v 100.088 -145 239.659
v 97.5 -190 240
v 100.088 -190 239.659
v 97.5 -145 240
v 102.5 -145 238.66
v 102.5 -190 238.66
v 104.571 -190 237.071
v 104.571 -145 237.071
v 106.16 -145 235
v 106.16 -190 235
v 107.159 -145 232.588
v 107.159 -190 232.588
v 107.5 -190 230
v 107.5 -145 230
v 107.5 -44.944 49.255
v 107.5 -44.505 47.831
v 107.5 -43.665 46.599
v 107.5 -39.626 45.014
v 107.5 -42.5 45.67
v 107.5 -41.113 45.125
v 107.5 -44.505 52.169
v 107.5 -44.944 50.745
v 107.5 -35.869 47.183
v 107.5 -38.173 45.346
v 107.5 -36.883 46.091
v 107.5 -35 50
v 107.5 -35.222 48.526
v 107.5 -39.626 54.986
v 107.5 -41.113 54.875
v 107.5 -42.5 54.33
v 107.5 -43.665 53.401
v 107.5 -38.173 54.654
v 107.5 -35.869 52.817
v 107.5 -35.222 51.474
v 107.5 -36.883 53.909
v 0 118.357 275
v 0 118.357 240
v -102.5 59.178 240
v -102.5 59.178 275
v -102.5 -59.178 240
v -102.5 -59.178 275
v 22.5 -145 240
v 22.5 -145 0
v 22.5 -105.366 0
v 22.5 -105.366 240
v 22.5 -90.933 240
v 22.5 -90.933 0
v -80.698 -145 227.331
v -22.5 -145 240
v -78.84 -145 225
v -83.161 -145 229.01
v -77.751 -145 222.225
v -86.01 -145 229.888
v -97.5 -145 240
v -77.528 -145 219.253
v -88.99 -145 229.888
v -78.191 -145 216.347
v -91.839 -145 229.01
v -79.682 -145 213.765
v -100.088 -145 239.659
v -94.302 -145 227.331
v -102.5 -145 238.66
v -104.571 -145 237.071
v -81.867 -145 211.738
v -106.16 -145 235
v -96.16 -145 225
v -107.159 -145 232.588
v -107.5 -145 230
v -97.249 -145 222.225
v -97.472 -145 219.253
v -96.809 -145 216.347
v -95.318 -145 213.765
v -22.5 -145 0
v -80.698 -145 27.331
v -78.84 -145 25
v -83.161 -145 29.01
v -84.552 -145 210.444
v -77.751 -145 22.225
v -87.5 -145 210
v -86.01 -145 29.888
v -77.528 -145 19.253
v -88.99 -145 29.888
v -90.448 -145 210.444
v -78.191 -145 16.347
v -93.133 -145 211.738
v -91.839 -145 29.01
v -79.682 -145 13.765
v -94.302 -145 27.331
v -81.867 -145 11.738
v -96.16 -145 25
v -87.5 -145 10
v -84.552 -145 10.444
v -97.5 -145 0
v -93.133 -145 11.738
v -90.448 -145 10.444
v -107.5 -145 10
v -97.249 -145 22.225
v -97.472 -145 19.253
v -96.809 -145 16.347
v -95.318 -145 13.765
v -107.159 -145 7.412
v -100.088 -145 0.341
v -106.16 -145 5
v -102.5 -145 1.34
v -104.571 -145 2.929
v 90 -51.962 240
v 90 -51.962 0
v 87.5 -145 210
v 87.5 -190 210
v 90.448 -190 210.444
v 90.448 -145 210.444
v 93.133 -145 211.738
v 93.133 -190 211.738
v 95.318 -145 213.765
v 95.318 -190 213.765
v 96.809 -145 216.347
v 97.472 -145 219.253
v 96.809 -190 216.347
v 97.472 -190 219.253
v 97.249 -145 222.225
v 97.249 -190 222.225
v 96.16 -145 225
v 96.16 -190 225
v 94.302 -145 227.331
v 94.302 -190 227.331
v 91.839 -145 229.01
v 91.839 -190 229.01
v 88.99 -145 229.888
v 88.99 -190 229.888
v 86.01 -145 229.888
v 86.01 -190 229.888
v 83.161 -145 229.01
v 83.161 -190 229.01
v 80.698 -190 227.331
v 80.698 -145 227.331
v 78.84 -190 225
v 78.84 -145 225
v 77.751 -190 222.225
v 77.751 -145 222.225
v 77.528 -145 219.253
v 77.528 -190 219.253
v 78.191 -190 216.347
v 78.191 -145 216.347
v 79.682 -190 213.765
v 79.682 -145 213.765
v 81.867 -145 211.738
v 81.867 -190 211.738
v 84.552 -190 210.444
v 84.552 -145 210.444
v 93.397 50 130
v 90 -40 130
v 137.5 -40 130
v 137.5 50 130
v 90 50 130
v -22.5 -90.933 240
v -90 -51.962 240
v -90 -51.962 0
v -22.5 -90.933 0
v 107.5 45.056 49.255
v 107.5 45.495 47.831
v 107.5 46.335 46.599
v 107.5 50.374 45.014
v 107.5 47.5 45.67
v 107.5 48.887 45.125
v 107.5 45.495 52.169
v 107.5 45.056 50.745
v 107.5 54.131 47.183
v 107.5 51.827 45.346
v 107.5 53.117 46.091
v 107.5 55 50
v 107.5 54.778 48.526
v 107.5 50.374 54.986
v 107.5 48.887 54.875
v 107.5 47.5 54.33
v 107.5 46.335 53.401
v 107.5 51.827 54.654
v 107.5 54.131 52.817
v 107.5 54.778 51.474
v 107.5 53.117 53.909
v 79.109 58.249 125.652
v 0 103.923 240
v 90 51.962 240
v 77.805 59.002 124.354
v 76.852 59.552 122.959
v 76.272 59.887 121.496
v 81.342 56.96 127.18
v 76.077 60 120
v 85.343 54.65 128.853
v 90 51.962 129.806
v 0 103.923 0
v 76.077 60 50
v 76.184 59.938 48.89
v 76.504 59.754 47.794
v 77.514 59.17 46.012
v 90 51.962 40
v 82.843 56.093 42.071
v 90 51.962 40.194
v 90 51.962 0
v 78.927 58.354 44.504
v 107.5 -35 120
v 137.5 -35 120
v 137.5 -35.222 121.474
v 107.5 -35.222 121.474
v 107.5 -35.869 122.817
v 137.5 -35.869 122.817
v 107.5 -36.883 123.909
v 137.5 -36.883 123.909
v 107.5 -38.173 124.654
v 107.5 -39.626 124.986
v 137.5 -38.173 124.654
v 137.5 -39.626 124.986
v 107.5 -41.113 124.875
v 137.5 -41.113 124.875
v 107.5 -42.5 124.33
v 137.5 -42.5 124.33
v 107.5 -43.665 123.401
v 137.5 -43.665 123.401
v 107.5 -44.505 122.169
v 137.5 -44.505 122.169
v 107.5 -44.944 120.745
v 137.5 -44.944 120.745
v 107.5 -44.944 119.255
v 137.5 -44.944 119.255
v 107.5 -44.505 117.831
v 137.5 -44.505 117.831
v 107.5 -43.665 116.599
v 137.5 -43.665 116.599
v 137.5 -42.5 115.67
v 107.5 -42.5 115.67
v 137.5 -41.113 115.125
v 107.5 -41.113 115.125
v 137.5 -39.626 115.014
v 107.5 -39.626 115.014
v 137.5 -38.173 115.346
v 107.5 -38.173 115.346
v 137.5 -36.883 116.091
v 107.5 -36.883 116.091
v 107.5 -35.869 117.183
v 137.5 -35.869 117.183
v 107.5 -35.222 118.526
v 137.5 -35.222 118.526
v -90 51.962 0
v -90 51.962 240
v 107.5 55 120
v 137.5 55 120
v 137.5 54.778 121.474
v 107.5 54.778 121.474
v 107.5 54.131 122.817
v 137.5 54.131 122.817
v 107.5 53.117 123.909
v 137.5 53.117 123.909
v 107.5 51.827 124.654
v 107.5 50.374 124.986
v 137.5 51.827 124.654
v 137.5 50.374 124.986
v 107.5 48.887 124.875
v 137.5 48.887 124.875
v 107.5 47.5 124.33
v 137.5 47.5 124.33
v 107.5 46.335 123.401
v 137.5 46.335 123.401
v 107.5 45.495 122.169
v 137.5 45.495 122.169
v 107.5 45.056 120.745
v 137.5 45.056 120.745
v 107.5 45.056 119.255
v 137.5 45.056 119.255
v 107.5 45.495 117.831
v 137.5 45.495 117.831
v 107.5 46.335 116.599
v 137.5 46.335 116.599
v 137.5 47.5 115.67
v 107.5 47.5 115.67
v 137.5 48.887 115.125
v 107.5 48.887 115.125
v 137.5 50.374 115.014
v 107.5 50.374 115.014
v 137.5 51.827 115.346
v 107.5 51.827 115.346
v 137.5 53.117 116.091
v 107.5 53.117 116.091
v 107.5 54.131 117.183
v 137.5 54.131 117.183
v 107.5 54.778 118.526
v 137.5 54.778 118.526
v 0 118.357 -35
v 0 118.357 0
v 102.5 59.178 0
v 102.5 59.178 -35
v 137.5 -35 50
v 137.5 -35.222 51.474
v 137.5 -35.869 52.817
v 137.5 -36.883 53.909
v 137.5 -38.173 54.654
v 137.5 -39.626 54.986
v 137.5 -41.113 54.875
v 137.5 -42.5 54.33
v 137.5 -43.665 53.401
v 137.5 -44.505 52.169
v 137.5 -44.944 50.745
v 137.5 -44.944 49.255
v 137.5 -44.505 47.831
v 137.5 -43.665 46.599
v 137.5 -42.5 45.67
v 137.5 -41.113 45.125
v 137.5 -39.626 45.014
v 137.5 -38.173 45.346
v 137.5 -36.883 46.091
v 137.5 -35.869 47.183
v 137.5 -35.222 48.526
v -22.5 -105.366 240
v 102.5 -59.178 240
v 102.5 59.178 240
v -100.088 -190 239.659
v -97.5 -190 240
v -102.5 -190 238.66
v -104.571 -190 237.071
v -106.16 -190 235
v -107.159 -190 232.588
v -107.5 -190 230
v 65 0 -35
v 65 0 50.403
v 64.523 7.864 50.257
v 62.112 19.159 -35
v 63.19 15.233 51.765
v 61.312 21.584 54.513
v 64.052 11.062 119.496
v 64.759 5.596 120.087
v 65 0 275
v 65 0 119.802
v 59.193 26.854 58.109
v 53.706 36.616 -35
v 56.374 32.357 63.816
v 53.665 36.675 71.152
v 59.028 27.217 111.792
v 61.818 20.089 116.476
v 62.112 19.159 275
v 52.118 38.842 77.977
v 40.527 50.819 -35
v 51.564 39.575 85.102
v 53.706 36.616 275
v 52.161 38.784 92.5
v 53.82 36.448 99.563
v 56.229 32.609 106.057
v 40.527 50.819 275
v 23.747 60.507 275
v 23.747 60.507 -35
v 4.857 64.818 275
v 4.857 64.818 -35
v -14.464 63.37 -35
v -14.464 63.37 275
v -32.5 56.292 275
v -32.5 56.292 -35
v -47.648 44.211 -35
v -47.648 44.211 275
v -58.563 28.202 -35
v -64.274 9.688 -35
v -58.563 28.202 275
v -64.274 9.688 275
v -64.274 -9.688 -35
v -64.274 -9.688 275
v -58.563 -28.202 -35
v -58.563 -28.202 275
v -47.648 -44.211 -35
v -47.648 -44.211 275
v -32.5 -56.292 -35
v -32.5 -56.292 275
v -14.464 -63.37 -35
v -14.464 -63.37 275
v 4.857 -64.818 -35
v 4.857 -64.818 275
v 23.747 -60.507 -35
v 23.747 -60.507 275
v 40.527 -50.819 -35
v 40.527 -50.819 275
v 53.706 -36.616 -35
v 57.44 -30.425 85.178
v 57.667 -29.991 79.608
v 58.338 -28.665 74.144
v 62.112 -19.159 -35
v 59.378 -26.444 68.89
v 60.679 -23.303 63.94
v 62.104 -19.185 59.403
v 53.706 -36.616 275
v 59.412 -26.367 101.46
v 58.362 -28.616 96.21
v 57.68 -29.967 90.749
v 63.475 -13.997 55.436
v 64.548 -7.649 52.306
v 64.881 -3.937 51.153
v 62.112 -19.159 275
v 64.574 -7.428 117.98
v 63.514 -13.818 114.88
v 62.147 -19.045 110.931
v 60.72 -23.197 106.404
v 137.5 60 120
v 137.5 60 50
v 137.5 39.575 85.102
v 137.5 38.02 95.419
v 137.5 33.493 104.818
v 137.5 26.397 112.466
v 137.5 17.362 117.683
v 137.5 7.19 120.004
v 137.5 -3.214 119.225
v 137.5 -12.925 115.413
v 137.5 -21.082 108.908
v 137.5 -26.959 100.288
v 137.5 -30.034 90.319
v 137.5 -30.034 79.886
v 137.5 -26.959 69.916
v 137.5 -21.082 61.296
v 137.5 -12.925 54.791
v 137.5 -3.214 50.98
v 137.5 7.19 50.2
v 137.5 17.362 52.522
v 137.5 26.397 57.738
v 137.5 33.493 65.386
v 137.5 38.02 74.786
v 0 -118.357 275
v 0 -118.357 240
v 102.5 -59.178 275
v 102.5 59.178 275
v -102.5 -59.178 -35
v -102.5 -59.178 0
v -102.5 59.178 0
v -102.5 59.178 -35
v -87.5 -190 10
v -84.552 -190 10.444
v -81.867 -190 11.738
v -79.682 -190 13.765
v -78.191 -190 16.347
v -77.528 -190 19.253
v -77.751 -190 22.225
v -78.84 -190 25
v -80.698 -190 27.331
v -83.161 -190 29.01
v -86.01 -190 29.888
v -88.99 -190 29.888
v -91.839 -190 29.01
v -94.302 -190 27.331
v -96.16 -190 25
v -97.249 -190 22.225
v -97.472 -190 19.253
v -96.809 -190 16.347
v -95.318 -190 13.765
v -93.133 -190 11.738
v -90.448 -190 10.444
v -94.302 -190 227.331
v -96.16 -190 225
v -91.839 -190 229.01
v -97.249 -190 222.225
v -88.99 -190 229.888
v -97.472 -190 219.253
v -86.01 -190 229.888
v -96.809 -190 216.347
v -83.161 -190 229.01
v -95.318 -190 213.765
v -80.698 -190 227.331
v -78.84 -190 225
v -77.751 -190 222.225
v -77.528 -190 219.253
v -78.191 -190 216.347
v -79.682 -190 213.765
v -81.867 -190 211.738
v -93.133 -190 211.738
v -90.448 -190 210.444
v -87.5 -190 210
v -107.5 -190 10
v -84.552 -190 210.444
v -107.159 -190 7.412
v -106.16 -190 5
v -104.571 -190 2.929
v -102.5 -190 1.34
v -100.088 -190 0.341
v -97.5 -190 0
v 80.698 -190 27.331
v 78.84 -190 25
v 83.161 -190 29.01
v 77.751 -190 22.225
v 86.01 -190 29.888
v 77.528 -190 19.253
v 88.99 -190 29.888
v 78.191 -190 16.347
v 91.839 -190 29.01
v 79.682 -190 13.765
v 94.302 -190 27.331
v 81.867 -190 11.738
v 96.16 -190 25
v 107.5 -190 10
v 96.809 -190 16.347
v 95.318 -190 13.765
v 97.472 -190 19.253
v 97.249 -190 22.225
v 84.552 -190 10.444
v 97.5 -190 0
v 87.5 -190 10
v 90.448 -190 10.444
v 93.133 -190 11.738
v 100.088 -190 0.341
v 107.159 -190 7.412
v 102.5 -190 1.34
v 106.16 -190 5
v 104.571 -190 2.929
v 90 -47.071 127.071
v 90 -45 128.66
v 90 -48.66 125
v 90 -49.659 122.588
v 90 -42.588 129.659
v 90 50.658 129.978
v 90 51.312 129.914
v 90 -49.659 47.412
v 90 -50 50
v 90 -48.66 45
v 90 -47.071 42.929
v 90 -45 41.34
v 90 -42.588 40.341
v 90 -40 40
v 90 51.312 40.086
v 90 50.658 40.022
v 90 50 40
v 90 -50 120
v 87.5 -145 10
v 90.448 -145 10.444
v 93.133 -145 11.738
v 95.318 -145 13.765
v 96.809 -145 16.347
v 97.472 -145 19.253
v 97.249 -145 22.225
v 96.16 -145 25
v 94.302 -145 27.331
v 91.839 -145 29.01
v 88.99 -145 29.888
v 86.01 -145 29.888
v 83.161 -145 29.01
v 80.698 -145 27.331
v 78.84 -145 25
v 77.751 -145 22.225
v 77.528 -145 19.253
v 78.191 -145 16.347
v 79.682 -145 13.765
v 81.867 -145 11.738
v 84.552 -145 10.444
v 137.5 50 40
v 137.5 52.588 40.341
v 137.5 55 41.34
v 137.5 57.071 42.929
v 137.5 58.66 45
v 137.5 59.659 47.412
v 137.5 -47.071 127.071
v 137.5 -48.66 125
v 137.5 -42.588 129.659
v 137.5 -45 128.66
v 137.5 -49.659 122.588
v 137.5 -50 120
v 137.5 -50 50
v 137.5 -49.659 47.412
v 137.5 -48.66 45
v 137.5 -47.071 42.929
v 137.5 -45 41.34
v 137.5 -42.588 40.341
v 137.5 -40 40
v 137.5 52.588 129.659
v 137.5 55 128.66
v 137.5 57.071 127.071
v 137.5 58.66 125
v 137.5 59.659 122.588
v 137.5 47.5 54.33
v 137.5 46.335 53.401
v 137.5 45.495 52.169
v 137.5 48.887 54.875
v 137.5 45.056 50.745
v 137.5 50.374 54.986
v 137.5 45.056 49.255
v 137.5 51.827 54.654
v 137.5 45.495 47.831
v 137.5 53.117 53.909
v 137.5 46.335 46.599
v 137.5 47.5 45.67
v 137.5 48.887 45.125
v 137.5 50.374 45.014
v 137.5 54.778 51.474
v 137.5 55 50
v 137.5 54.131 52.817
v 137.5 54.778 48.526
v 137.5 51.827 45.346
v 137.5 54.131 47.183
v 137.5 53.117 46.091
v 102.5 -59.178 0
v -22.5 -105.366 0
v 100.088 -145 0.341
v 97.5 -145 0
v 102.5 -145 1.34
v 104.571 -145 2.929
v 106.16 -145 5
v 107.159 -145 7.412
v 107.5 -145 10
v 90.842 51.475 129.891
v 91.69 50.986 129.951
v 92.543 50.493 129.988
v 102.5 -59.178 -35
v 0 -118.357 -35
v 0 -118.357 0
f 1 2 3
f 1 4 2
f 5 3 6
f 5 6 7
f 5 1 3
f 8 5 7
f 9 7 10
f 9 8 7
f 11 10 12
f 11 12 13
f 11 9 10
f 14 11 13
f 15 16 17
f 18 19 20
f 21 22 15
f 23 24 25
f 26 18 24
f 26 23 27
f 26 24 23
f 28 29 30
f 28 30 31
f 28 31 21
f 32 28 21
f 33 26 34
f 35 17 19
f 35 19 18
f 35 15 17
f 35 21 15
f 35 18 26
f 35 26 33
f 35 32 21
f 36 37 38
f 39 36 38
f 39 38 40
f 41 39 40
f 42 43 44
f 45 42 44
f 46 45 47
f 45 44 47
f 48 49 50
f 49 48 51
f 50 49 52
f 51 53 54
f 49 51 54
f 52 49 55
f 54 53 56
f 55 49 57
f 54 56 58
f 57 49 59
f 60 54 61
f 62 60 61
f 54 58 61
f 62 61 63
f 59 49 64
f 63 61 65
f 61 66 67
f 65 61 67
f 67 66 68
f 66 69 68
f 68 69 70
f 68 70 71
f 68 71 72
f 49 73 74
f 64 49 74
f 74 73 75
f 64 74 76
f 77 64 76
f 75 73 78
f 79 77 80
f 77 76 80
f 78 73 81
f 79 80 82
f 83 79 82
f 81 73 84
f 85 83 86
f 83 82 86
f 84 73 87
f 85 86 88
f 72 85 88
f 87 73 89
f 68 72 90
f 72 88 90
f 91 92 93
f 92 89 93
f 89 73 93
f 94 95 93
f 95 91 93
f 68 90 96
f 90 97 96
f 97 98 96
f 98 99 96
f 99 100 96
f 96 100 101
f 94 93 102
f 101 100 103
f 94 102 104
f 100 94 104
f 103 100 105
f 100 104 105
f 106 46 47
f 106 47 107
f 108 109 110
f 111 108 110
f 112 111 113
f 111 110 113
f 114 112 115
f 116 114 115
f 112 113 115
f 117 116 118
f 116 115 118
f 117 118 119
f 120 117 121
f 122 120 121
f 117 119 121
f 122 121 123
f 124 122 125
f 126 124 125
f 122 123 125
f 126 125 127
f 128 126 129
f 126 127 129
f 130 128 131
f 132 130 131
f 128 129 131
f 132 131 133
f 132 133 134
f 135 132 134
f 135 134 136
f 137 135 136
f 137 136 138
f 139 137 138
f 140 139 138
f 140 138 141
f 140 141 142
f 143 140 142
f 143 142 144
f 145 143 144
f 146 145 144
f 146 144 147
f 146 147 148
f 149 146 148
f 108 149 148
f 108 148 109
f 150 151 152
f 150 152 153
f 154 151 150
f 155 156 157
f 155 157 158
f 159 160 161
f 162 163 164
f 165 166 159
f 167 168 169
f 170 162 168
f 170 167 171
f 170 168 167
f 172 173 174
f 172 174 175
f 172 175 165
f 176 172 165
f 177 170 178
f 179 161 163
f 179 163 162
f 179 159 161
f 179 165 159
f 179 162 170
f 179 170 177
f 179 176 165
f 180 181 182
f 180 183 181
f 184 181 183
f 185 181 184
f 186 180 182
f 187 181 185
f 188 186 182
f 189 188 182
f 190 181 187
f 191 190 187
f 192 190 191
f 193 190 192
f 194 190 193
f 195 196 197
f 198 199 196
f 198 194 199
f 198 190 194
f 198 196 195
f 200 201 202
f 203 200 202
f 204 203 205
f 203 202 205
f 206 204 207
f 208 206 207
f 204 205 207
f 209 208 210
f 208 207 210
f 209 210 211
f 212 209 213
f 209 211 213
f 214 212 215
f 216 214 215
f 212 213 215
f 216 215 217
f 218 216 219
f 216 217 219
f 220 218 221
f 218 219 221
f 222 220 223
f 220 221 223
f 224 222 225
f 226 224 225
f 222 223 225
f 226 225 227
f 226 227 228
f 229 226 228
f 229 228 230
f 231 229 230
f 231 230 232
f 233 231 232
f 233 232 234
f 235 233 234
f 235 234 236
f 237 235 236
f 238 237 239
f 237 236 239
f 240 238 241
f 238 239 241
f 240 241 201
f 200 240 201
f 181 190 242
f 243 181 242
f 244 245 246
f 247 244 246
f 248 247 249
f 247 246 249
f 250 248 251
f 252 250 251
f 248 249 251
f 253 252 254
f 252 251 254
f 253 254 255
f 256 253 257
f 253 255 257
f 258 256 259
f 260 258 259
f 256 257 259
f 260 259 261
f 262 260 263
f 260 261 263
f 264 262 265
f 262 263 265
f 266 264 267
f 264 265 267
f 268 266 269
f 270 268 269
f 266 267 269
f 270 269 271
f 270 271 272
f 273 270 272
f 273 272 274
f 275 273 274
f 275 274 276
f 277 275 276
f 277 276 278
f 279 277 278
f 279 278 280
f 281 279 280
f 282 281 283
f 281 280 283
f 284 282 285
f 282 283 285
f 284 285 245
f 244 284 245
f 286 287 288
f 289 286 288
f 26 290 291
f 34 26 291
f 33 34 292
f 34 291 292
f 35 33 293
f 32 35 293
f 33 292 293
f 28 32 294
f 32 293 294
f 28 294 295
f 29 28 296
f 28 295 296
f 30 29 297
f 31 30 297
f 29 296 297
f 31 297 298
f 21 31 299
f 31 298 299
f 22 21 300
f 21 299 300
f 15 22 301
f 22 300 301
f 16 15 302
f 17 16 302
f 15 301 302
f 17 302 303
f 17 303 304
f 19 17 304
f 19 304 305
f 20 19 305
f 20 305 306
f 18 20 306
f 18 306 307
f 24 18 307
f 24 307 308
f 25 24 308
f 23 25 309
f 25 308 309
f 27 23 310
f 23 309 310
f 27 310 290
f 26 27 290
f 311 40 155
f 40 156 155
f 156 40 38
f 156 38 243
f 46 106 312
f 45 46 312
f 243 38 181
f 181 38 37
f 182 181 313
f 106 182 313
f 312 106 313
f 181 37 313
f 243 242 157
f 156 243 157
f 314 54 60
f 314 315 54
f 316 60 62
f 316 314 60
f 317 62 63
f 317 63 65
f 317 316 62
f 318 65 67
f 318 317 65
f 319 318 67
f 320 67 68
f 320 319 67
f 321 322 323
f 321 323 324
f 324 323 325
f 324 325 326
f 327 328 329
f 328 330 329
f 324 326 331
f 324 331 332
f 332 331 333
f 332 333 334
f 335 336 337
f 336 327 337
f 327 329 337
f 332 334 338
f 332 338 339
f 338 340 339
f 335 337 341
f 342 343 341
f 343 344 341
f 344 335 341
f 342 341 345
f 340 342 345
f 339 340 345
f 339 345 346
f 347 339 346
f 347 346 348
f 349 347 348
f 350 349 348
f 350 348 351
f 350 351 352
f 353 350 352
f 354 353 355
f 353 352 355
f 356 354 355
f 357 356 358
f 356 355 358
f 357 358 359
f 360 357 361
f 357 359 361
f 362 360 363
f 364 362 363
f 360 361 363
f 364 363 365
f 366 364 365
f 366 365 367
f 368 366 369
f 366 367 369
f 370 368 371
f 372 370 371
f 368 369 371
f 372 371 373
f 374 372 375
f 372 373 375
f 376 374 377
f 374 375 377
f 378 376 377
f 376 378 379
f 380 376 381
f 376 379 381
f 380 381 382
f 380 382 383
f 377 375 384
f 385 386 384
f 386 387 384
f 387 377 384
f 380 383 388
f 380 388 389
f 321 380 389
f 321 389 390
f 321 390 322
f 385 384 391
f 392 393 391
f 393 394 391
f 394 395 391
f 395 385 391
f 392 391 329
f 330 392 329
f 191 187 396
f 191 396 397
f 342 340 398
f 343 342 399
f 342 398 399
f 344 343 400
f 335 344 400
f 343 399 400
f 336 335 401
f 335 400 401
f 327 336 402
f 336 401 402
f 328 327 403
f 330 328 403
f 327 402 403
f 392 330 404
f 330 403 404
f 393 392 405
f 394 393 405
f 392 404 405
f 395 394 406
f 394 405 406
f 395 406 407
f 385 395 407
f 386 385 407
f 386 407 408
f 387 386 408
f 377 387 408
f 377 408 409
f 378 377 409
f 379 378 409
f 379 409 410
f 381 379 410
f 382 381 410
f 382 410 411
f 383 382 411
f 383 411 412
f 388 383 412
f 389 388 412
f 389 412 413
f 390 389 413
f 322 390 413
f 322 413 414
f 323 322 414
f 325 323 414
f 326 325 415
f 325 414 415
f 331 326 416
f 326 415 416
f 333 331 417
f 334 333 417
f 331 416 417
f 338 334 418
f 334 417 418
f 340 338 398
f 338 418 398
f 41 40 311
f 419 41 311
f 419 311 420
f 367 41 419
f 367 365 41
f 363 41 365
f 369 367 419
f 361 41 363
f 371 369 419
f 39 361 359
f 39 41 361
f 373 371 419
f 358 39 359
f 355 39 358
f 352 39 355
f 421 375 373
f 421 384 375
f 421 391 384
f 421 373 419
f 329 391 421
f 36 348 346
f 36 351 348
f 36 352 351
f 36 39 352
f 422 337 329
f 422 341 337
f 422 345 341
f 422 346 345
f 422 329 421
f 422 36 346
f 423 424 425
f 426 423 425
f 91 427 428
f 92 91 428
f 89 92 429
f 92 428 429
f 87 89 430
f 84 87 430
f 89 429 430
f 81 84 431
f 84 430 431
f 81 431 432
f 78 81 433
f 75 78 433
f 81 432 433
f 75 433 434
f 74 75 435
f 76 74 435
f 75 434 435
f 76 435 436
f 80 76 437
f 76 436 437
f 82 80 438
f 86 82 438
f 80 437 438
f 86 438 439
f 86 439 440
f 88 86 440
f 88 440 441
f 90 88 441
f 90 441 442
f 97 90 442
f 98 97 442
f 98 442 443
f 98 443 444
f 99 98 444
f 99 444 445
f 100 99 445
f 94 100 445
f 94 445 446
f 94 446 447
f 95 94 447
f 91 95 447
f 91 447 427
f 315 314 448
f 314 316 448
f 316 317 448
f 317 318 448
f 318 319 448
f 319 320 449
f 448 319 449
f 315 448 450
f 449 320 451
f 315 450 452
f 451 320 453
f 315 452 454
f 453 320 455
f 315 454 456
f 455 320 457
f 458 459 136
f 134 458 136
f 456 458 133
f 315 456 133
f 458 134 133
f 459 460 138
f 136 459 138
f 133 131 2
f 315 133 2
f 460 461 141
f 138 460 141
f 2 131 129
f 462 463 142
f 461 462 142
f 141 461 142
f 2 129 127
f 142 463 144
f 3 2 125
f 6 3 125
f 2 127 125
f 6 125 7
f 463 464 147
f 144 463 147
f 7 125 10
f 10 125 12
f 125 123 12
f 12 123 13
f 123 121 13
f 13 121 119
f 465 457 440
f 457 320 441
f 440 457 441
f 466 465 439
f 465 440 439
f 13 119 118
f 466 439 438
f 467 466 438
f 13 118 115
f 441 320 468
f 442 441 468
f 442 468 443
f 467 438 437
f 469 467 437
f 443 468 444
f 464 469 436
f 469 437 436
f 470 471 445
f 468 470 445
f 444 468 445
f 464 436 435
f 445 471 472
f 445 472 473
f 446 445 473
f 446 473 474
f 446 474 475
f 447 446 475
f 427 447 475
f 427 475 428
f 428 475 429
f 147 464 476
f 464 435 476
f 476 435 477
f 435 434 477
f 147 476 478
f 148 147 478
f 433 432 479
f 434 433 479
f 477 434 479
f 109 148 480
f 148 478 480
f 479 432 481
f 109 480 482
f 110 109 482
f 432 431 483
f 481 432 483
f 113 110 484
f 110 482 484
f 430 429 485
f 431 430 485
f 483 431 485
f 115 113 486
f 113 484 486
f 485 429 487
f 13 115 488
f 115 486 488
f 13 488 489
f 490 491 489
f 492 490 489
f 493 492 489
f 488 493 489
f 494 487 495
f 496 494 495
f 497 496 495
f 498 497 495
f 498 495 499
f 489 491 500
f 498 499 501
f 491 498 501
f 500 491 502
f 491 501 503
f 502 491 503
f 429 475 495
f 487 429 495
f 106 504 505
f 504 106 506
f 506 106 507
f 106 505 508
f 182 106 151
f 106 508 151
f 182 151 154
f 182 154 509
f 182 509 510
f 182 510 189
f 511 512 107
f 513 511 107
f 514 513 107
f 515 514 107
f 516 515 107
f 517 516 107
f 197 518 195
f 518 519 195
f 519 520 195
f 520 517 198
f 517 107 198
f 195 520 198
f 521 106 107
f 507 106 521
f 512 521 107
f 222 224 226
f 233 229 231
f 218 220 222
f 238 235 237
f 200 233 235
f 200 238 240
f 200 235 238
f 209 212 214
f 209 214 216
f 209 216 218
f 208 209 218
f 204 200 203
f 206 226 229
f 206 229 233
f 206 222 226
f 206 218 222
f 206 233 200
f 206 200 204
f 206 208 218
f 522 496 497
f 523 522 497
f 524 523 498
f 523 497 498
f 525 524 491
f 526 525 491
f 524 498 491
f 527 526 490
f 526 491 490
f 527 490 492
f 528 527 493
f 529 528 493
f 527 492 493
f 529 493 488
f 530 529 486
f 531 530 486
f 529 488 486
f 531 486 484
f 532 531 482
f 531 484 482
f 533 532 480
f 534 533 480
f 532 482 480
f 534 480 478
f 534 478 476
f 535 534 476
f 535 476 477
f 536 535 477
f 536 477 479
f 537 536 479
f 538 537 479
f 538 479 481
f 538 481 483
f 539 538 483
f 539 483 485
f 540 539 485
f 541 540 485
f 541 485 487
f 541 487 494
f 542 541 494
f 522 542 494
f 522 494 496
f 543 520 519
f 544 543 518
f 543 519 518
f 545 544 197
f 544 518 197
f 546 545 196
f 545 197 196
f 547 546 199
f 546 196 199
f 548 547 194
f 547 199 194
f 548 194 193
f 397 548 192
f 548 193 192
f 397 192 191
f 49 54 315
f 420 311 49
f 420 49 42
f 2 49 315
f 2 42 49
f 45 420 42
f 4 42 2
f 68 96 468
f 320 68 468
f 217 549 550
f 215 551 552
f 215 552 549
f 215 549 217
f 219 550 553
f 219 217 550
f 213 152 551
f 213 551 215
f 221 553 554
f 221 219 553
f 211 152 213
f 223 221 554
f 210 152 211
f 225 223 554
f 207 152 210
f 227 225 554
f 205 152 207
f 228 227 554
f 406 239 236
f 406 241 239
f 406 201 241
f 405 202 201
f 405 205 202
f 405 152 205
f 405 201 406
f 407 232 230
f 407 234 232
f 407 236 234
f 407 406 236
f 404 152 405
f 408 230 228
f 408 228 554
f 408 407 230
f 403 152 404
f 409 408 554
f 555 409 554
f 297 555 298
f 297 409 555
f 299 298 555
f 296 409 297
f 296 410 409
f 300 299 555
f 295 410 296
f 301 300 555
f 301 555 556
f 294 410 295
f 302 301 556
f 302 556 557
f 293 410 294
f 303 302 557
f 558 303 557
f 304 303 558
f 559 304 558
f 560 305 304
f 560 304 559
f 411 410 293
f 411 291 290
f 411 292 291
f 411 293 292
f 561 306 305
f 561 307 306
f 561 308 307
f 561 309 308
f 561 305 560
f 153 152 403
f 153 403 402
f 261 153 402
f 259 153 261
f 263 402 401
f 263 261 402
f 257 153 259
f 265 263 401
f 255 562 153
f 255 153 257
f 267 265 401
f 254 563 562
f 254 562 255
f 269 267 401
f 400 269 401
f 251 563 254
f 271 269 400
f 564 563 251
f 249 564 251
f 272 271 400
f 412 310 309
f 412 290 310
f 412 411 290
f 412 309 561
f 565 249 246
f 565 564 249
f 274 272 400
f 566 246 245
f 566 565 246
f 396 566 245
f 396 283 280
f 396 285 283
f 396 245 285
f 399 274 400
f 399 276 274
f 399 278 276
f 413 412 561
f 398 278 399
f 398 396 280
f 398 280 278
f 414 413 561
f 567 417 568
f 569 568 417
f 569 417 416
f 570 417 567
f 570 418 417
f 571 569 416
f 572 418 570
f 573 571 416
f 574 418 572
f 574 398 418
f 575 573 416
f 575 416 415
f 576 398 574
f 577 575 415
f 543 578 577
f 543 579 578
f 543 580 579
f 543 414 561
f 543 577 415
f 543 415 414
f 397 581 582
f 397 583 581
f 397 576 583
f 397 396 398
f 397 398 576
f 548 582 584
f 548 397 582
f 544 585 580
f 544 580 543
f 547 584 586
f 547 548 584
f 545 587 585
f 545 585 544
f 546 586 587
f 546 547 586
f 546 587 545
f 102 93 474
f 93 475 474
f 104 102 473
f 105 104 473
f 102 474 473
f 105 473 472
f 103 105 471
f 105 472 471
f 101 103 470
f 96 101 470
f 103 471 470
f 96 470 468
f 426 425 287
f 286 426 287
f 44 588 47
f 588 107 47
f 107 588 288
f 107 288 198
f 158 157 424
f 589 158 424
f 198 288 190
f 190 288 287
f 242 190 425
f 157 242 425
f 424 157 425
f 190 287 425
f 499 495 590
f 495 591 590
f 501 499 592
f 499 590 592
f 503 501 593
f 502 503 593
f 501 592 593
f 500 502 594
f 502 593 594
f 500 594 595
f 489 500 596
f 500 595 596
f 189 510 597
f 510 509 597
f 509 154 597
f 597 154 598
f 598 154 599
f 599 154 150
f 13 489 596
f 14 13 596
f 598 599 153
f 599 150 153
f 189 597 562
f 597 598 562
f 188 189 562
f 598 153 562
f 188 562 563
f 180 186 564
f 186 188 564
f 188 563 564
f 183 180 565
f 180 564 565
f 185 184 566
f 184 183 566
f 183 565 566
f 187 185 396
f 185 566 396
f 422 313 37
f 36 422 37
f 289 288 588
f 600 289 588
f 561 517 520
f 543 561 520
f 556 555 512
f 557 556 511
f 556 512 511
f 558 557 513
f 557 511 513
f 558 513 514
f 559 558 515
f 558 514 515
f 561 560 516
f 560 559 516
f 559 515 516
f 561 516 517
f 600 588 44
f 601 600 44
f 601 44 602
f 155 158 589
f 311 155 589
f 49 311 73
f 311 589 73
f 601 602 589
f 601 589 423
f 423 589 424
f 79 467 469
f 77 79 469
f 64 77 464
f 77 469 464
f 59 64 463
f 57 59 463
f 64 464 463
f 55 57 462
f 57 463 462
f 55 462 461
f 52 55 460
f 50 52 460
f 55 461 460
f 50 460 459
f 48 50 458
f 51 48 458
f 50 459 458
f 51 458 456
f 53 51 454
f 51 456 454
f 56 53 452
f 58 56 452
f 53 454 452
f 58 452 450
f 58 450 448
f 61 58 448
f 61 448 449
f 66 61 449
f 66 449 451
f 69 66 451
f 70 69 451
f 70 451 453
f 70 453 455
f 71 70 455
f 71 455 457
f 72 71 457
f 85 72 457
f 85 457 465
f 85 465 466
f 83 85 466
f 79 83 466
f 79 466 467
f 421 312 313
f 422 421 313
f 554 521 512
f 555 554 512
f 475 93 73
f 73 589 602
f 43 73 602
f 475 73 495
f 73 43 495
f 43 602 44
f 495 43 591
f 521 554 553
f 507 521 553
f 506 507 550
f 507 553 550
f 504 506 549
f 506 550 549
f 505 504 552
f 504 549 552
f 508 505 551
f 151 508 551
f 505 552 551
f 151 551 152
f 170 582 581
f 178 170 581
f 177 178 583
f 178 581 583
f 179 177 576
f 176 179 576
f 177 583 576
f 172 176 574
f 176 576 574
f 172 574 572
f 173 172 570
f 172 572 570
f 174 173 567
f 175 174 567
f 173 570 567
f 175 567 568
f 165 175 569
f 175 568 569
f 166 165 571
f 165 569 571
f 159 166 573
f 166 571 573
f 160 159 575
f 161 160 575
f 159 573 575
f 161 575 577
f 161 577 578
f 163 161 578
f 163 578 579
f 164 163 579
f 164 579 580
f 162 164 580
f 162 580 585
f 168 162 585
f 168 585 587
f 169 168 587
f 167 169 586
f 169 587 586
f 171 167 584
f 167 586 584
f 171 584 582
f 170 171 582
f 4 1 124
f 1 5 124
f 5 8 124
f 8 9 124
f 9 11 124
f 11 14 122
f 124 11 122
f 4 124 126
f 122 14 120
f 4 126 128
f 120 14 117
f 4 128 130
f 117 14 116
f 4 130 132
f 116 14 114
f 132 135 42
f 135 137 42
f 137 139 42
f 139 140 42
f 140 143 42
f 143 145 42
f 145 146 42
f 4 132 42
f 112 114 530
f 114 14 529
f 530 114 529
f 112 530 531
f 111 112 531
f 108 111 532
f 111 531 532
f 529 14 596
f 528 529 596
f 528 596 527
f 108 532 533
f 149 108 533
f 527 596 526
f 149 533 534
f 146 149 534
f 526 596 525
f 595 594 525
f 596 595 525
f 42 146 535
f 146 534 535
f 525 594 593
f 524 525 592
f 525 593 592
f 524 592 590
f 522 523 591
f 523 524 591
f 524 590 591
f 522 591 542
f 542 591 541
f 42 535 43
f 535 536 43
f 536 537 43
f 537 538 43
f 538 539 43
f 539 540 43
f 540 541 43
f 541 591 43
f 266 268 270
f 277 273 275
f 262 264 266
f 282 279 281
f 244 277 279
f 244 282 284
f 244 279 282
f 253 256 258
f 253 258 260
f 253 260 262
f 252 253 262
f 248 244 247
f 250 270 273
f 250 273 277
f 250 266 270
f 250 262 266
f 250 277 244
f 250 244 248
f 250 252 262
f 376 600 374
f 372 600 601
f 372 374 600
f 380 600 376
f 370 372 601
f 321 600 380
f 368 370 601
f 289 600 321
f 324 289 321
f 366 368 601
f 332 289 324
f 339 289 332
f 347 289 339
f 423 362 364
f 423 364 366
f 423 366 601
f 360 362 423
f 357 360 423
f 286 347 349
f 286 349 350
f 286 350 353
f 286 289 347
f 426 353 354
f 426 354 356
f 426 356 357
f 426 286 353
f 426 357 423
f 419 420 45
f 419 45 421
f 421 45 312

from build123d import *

# Parameters (mm, degrees)
EXTRUDE_1_DEPTH          = 240
EXTRUDE_2_DEPTH          = 35
EXTRUDE_3_DEPTH          = 35
EXTRUDE_5_DEPTH          = 35
EXTRUDE_5_DEPTH_BACK     = 90
SKETCH_9_W               = 90
SKETCH_9_H               = 110
SKETCH_10_R              = 65
CUT_EXTRUDE_1_DEPTH      = 389.72387372
CUT_EXTRUDE_2_REACH      = 416.427
CUT_EXTRUDE_2_END_RADIUS = 65
SKETCH_12_R              = 35
CUT_EXTRUDE_3_REACH      = 437.448
SKETCH_15_R              = 10
SKETCH_16_R              = 5
CUT_EXTRUDE_4_DEPTH      = 30
FILLET_13_R              = 10
FILLET_15_R              = 10


with BuildPart() as part:
    # Эскиз1 → Бобышка-Вытянуть1 (new body)
    with BuildSketch(Plane.XY):
        Polygon((0, 103.923048454), (-90, 51.961524227), (-90, -51.961524227), (-22.5, -90.932667397), (-22.5, -145), (-107.5, -145), (-107.5, -190), (107.5, -190), (107.5, -145), (22.5, -145), (22.5, -90.932667397), (90, -51.961524227), (90, 51.961524227), align=None)
    extrude(amount=EXTRUDE_1_DEPTH)

    # Эскиз2 → Бобышка-Вытянуть2 (add)
    with BuildSketch(Plane.XY.offset(240)):
        Polygon((0, 118.356805184), (-102.5, 59.178402592), (-102.5, -59.178402592), (0, -118.356805184), (102.5, -59.178402592), (102.5, 59.178402592), align=None)
    extrude(amount=EXTRUDE_2_DEPTH)

    # Эскиз6 → Бобышка-Вытянуть3 (add)
    with BuildSketch(Plane(origin=(0, 0, 0), x_dir=(-1, 0, 0), z_dir=(0, 0, -1))):
        Polygon((0, 118.356805184), (-102.5, 59.178402592), (-102.5, -59.178402592), (0, -118.356805184), (102.5, -59.178402592), (102.5, 59.178402592), align=None)
    extrude(amount=EXTRUDE_3_DEPTH)

    # Эскиз9 → Бобышка-Вытянуть5 (add, two sides: drawn at the far end of the back side and taken through both)
    with BuildSketch(Plane(origin=(102.5, 0, 0), x_dir=(0, 0, -1), z_dir=(1, 0, 0)).offset(-EXTRUDE_5_DEPTH_BACK)):
        with Locations((-85, 5)):
            Rectangle(SKETCH_9_W, SKETCH_9_H)
    extrude(amount=EXTRUDE_5_DEPTH + EXTRUDE_5_DEPTH_BACK)

    # Эскиз10 → Вырез-Вытянуть1 (cut, through all)
    with BuildSketch(Plane.XY.offset(275)):
        Circle(SKETCH_10_R)
    extrude(amount=-CUT_EXTRUDE_1_DEPTH, mode=Mode.SUBTRACT)

    # Вырез-Вытянуть2: up to this cylinder (the profile starts outside it)
    cut_extrude_2_end = Plane(origin=(0, 0, 85.10225), z_dir=(0, 0, 1)) * Cylinder(CUT_EXTRUDE_2_END_RADIUS, 963.854, mode=Mode.PRIVATE)
    # Эскиз12 → Вырез-Вытянуть2 (cut, up to the surface)
    with BuildSketch(Plane(origin=(137.5, 0, 0), x_dir=(0, 0, -1), z_dir=(1, 0, 0)), mode=Mode.PRIVATE) as cut_extrude_2_sk1:
        with Locations(Location((-85.102250197, 4.574709124, 0), (0, 0, 90))):
            Circle(SKETCH_12_R)
    cut_extrude_2_tool1 = extrude(cut_extrude_2_sk1.sketch, amount=-CUT_EXTRUDE_2_REACH, mode=Mode.PRIVATE) - cut_extrude_2_end
    add(cut_extrude_2_tool1.solids().sort_by_distance((137.5, 4.574709, 85.10225))[0], mode=Mode.SUBTRACT)

    # Эскиз15 → Вырез-Вытянуть3 (cut, up to next)
    with BuildSketch(Plane(origin=(0, -190, 0), x_dir=(-1, 0, 0), z_dir=(0, -1, 0)), mode=Mode.PRIVATE) as cut_extrude_3_sk1:
        with Locations(Location((87.5, -220, 0), (0, 0, 90))):
            Circle(SKETCH_15_R)
    cut_extrude_3_tool1 = extrude(cut_extrude_3_sk1.sketch, amount=-CUT_EXTRUDE_3_REACH, mode=Mode.PRIVATE) & part.part
    # Эскиз15 → Вырез-Вытянуть3 (cut, up to next)
    with BuildSketch(Plane(origin=(0, -190, 0), x_dir=(-1, 0, 0), z_dir=(0, -1, 0)), mode=Mode.PRIVATE) as cut_extrude_3_sk2:
        with Locations(Location((-87.5, -220, 0), (0, 0, 90))):
            Circle(SKETCH_15_R)
    cut_extrude_3_tool2 = extrude(cut_extrude_3_sk2.sketch, amount=-CUT_EXTRUDE_3_REACH, mode=Mode.PRIVATE) & part.part
    # Эскиз15 → Вырез-Вытянуть3 (cut, up to next)
    with BuildSketch(Plane(origin=(0, -190, 0), x_dir=(-1, 0, 0), z_dir=(0, -1, 0)), mode=Mode.PRIVATE) as cut_extrude_3_sk3:
        with Locations(Location((-87.5, -20, 0), (0, 0, 90))):
            Circle(SKETCH_15_R)
    cut_extrude_3_tool3 = extrude(cut_extrude_3_sk3.sketch, amount=-CUT_EXTRUDE_3_REACH, mode=Mode.PRIVATE) & part.part
    # Эскиз15 → Вырез-Вытянуть3 (cut, up to next)
    with BuildSketch(Plane(origin=(0, -190, 0), x_dir=(-1, 0, 0), z_dir=(0, -1, 0)), mode=Mode.PRIVATE) as cut_extrude_3_sk4:
        with Locations(Location((87.5, -20, 0), (0, 0, 90))):
            Circle(SKETCH_15_R)
    cut_extrude_3_tool4 = extrude(cut_extrude_3_sk4.sketch, amount=-CUT_EXTRUDE_3_REACH, mode=Mode.PRIVATE) & part.part
    add(cut_extrude_3_tool1.solids().sort_by_distance((-87.5, -190, 220))[0], mode=Mode.SUBTRACT)
    add(cut_extrude_3_tool2.solids().sort_by_distance((87.5, -190, 220))[0], mode=Mode.SUBTRACT)
    add(cut_extrude_3_tool3.solids().sort_by_distance((87.5, -190, 20))[0], mode=Mode.SUBTRACT)
    add(cut_extrude_3_tool4.solids().sort_by_distance((-87.5, -190, 20))[0], mode=Mode.SUBTRACT)

    # Эскиз16 → Вырез-Вытянуть4 (cut)
    with BuildSketch(Plane(origin=(137.5, 0, 0), x_dir=(0, 0, -1), z_dir=(1, 0, 0))):
        with Locations(Location((-120, 50, 0), (0, 0, 90))):
            Circle(SKETCH_16_R)
        with Locations(Location((-50, 50, 0), (0, 0, 90))):
            Circle(SKETCH_16_R)
        with Locations(Location((-120, -40, 0), (0, 0, 90))):
            Circle(SKETCH_16_R)
        with Locations(Location((-50, -40, 0), (0, 0, 90))):
            Circle(SKETCH_16_R)
    extrude(amount=-CUT_EXTRUDE_4_DEPTH, mode=Mode.SUBTRACT)

    # Скругление13
    # the kernel refuses this fillet: 10 mm, written as the material it takes off along each edge
    with BuildSketch(Plane(origin=(51.076951546, 60, 40), x_dir=(0, 0, 1), z_dir=(1, 0, 0))) as fillet_13_piece_1_section:
        with BuildLine():
            CenterArc((FILLET_13_R, FILLET_13_R), FILLET_13_R, 180, 90)
            Line((0, FILLET_13_R), (0, 0))
            Line((0, 0), (FILLET_13_R, 0))
        make_face()
    fillet_13_piece_1 = extrude(amount=111.423048454, mode=Mode.PRIVATE)
    fillet_13_piece_1 = split(fillet_13_piece_1, bisect_by=Plane(origin=(91.336979789, 51.189618586, 39.919231597), z_dir=(-0.5000000000000002, -0.8660254037844386, 0)), keep=Keep.TOP, mode=Mode.PRIVATE)
    fillet_13_piece_1 = split(fillet_13_piece_1, bisect_by=Plane(origin=(90, 50.726475201, 39.919231597), z_dir=(1, 0, 0)), keep=Keep.TOP, mode=Mode.PRIVATE)
    add(fillet_13_piece_1, mode=Mode.SUBTRACT)
    with BuildSketch(Plane(origin=(51.076951546, 60, 40), x_dir=(0, 0, 1), z_dir=(1, 0, 0))) as fillet_13_piece_2_section:
        with BuildLine():
            CenterArc((FILLET_13_R, FILLET_13_R), FILLET_13_R, 180, 90)
            Line((0, FILLET_13_R), (0, 0))
            Line((0, 0), (FILLET_13_R, 0))
        make_face()
    fillet_13_piece_2 = extrude(amount=111.423048454, mode=Mode.PRIVATE)
    fillet_13_piece_2 = split(fillet_13_piece_2, bisect_by=Plane(origin=(82.903194499, 56.058866794, 42.730902083), z_dir=(0.5000000000000002, 0.8660254037844386, 0)), keep=Keep.TOP, mode=Mode.PRIVATE)
    fillet_13_piece_2 = split(fillet_13_piece_2, bisect_by=Plane(origin=(90, 58.517272333, 42.730902083), z_dir=(-1, 0, 0)), keep=Keep.TOP, mode=Mode.PRIVATE)
    add(fillet_13_piece_2, mode=Mode.SUBTRACT)
    with BuildSketch(Plane(origin=(51.076951546, 60, 40), x_dir=(0, 0, 1), z_dir=(1, 0, 0))) as fillet_13_piece_3_section:
        with BuildLine():
            CenterArc((FILLET_13_R, FILLET_13_R), FILLET_13_R, 180, 90)
            Line((0, FILLET_13_R), (0, 0))
            Line((0, 0), (FILLET_13_R, 0))
        make_face()
    fillet_13_piece_3 = extrude(amount=111.423048454, mode=Mode.PRIVATE)
    fillet_13_piece_3 = split(fillet_13_piece_3, bisect_by=Plane(origin=(114.69683315, 37.70280096, 42.264932775), z_dir=(0.5000000000000002, 0.8660254037844386, 0)), keep=Keep.TOP, mode=Mode.PRIVATE)
    fillet_13_piece_3 = split(fillet_13_piece_3, bisect_by=Plane(origin=(90, 57.738983461, 42.264932775), z_dir=(1, 0, 0)), keep=Keep.TOP, mode=Mode.PRIVATE)
    add(fillet_13_piece_3, mode=Mode.SUBTRACT)
    with BuildSketch(Plane(origin=(162.5, 60, 130), x_dir=(0, -1, 0), z_dir=(-1, 0, 0))) as fillet_13_piece_4_section:
        with BuildLine():
            CenterArc((FILLET_13_R, -FILLET_13_R), FILLET_13_R, 90, 90)
            Line((0, -FILLET_13_R), (0, 0))
            Line((0, 0), (FILLET_13_R, 0))
        make_face()
    fillet_13_piece_4 = extrude(amount=111.423048454, mode=Mode.PRIVATE)
    fillet_13_piece_4 = split(fillet_13_piece_4, bisect_by=Plane(origin=(114.69683315, 37.70280096, 127.735067225), z_dir=(0.5000000000000002, 0.8660254037844386, 0)), keep=Keep.TOP, mode=Mode.PRIVATE)
    fillet_13_piece_4 = split(fillet_13_piece_4, bisect_by=Plane(origin=(90, 57.738983461, 127.735067225), z_dir=(1, 0, 0)), keep=Keep.TOP, mode=Mode.PRIVATE)
    add(fillet_13_piece_4, mode=Mode.SUBTRACT)
    with BuildSketch(Plane(origin=(162.5, 60, 130), x_dir=(0, -1, 0), z_dir=(-1, 0, 0))) as fillet_13_piece_5_section:
        with BuildLine():
            CenterArc((FILLET_13_R, -FILLET_13_R), FILLET_13_R, 90, 90)
            Line((0, -FILLET_13_R), (0, 0))
            Line((0, 0), (FILLET_13_R, 0))
        make_face()
    fillet_13_piece_5 = extrude(amount=111.423048454, mode=Mode.PRIVATE)
    fillet_13_piece_5 = split(fillet_13_piece_5, bisect_by=Plane(origin=(82.903194499, 56.058866793, 127.269097917), z_dir=(0.5000000000000002, 0.8660254037844386, 0)), keep=Keep.TOP, mode=Mode.PRIVATE)
    fillet_13_piece_5 = split(fillet_13_piece_5, bisect_by=Plane(origin=(90, 58.517272333, 127.269097917), z_dir=(-1, 0, 0)), keep=Keep.TOP, mode=Mode.PRIVATE)
    add(fillet_13_piece_5, mode=Mode.SUBTRACT)
    with BuildSketch(Plane(origin=(162.5, 60, 130), x_dir=(0, -1, 0), z_dir=(-1, 0, 0))) as fillet_13_piece_6_section:
        with BuildLine():
            CenterArc((FILLET_13_R, -FILLET_13_R), FILLET_13_R, 90, 90)
            Line((0, -FILLET_13_R), (0, 0))
            Line((0, 0), (FILLET_13_R, 0))
        make_face()
    fillet_13_piece_6 = extrude(amount=111.423048454, mode=Mode.PRIVATE)
    fillet_13_piece_6 = split(fillet_13_piece_6, bisect_by=Plane(origin=(91.336979789, 51.189618586, 130.080768403), z_dir=(-0.5000000000000002, -0.8660254037844386, 0)), keep=Keep.TOP, mode=Mode.PRIVATE)
    fillet_13_piece_6 = split(fillet_13_piece_6, bisect_by=Plane(origin=(90, 50.726475201, 130.080768403), z_dir=(1, 0, 0)), keep=Keep.TOP, mode=Mode.PRIVATE)
    add(fillet_13_piece_6, mode=Mode.SUBTRACT)
    with BuildSketch(Plane(origin=(90, -50, 40), x_dir=(0, 1, 0), z_dir=(1, 0, 0)), Plane(origin=(162.5, -50, 130), x_dir=(0, 1, 0), z_dir=(-1, 0, 0))) as fillet_13_piece_7:
        with BuildLine():
            CenterArc((FILLET_13_R, FILLET_13_R), FILLET_13_R, 180, 90)
            Line((0, FILLET_13_R), (0, 0))
            Line((0, 0), (FILLET_13_R, 0))
        make_face()
    extrude(amount=72.5, mode=Mode.SUBTRACT)

    # Скругление15
    fillet_15_edges = [part.edges().sort_by_distance(p)[0] for p in [
        (107.5, -167.5, 0),
        (-107.5, -167.5, 0),
        (-107.5, -167.5, 240),
        (107.5, -167.5, 240),
    ]]
    fillet(fillet_15_edges, radius=FILLET_15_R)


solid = part.part
